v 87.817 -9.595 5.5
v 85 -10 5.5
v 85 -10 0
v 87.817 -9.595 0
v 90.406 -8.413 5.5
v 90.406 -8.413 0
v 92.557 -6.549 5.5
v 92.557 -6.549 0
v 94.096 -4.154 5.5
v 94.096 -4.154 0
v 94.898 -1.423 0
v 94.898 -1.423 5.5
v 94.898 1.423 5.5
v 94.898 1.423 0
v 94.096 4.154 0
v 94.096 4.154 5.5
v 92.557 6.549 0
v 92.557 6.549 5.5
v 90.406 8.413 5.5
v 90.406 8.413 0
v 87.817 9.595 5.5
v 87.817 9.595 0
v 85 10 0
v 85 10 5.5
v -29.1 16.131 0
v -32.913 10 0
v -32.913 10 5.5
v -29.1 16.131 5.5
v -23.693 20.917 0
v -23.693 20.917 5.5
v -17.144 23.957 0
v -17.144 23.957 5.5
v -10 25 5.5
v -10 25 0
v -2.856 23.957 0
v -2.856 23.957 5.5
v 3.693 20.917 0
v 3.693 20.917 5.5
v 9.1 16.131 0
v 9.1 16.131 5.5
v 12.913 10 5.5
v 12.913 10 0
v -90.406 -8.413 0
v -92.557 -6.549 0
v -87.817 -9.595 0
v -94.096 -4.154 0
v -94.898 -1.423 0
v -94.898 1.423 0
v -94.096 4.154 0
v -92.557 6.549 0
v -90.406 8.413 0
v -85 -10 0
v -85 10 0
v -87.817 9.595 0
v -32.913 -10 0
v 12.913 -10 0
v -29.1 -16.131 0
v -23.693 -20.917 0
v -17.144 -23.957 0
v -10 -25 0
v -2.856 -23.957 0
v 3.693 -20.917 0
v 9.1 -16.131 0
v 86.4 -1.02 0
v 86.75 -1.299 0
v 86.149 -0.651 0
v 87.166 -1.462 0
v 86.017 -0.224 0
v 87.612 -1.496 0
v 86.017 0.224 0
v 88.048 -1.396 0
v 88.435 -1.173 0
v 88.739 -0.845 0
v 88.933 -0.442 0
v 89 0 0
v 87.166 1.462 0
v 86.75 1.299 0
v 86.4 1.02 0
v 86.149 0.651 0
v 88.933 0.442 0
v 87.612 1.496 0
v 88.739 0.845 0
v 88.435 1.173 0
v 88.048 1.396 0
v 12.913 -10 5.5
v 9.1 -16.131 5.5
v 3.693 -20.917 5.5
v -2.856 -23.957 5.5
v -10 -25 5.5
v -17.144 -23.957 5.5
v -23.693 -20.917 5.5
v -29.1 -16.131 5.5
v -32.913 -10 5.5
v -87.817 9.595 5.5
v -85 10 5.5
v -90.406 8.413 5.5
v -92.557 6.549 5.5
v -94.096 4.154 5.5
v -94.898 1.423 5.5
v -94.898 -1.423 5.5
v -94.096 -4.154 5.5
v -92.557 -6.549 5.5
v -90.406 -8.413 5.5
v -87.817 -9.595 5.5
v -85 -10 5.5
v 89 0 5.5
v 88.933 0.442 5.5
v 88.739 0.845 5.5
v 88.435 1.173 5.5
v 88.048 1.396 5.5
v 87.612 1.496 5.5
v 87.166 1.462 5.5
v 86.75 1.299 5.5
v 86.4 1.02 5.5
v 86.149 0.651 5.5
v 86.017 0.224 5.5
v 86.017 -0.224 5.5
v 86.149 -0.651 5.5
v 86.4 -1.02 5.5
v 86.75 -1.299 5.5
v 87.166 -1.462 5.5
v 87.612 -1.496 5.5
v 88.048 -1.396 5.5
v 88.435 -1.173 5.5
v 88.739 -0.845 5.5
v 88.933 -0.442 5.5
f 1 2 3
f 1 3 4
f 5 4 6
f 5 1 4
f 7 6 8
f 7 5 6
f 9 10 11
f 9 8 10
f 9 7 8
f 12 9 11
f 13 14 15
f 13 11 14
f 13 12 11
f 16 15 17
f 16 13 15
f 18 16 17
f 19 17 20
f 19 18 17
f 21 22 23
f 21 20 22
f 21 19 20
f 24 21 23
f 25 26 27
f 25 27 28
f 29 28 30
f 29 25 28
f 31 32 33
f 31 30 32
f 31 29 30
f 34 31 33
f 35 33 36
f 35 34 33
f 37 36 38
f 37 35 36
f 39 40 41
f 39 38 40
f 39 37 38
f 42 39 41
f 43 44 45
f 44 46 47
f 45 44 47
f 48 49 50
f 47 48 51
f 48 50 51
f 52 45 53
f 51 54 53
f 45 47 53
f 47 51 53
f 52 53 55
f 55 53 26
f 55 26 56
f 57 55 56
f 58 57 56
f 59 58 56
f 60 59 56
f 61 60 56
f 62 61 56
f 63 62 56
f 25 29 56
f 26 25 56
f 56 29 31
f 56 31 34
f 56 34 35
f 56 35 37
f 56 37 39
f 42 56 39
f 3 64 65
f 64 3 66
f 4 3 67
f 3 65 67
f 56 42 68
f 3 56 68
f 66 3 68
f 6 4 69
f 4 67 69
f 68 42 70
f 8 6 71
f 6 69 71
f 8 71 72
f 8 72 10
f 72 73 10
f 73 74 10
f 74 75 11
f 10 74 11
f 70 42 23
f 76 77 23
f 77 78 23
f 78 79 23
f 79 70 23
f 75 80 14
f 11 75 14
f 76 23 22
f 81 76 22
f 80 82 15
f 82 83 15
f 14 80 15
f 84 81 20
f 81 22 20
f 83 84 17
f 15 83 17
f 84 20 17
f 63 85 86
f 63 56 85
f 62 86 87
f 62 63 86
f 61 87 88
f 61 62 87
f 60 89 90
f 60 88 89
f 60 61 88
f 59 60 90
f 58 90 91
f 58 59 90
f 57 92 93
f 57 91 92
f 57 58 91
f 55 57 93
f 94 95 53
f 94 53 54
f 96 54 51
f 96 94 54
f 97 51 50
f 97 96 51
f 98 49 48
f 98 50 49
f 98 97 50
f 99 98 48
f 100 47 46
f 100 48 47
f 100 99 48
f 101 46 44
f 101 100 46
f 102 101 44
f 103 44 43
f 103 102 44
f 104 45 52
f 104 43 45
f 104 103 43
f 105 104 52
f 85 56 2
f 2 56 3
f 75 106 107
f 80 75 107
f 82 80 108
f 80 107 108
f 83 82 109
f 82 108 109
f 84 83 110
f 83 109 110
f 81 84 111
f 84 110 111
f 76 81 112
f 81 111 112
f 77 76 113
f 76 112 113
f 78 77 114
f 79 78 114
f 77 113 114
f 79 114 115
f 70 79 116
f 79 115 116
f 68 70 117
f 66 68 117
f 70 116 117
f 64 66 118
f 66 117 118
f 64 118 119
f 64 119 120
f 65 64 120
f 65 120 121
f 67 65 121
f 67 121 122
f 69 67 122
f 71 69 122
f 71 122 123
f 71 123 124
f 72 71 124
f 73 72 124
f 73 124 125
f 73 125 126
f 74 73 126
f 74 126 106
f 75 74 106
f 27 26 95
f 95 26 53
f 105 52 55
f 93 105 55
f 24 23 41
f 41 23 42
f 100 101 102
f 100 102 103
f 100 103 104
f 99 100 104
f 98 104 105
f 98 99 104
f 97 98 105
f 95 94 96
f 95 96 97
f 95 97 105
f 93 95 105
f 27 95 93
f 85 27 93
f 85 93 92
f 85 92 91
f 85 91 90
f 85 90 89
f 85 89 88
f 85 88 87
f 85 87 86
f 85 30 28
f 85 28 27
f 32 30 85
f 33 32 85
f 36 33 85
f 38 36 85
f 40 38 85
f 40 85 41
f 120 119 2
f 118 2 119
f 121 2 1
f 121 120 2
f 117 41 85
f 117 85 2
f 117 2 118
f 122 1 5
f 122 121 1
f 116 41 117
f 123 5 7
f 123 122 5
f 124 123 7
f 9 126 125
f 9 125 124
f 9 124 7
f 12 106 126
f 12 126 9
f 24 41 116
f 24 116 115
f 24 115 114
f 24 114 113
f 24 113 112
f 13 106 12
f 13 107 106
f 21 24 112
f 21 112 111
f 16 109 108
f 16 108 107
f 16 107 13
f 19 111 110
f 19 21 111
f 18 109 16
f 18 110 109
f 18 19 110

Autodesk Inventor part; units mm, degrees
ref_plane "YZ Plane" through (0, 0, 0) normal (1, 0, 0) x (0, 1, 0)
ref_plane "XZ Plane" through (0, 0, 0) normal (0, 1, 0) x (-1, 0, 0)
ref_plane "XY Plane" through (0, 0, 0) normal (0, 0, 1) x (1, 0, 0)
sketch "Boceto1" plane through (0, 0, 0) normal (0, 0, 1) x (1, 0, 0)
  line L0 (0, 0) -> (-20, 0)
  line L1 (-20, 0) -> (0, 0)
  line L2 (-20, 0) -> (0, 0)
  line L3 (-65, -10) -> (65, -10)
  line L4 (65, -10) -> (65, 10)
  line L5 (65, 10) -> (-65, 10)
  line L6 (-65, 10) -> (-65, -10)
  circle A0 centre (-10, 0) radius 25
  point P0 (-20, -35)
  point P1 (12.9129, 10)
  point P2 (-32.9129, 10)
  point P3 (-32.9129, -10)
  point P4 (12.9129, -10)
  dimension "d4" = 20
  dimension "d6" = 130
  dimension "d7" = 20
  dimension "d8" = 50
extrude "Extrusión1" add sketch "Boceto1" along normal blind 5.5
sketch "Boceto2" plane through (0, 0, 5.5) normal (0, 0, 1) x (1, 0, 0)
  line L0 (65, -10) -> (65, 10) projected
  line L1 (65, 0) -> (90, 0)
  line L2 (65, 0) -> (85, 0)
  line L3 (85, 0) -> (90, 0)
  circle A0 centre (87.5, 0) radius 1.5
  line L4 (65, 0) -> (95, 0)
  line L5 (95, 0) -> (95, -10)
  line L6 (12.9129, -10) -> (65, -10) projected
  line L7 (95, -10) -> (65, -10)
  line L8 (65, -10) -> (65, 10)
  line L9 (95, 10) -> (65, 10)
  line L10 (95, 0) -> (95, 10)
  arc A1 (95, -2.0554) -> (95, 0) centre (85.9536, -1.0277) ccw
  arc A2 (95, 0) -> (95, 2.0554) centre (85.9536, 1.0277) ccw
  arc A3 (85, -10) -> (85, 10) centre (85, 0) ccw
  point P0 (0, 0)
  point P1 (87.5, -10)
  point P2 (87.5, 10)
  point P3 (95, 2.0554)
  point P4 (87.5, 10)
  point P5 (95, -2.0554)
  dimension "d11" = 25
  dimension "d12" = 20
  dimension "d13" = 3
  dimension "d14" = 30
extrude "Extrusión2" add sketch "Boceto2" against normal blind 5.5 contours L0 L1 A0 L4 A3 L7 | L0 L9 A3 L4 L1 A0
sketch "Boceto4" plane through (0, 0, 5.5) normal (0, 0, 1) x (1, 0, 0)
  line L0 (-65, 10) -> (-65, -10) projected
  line L1 (-65, 0) -> (-95, 0)
  line L2 (-95, 0) -> (-95, 10)
  line L3 (-95, 10) -> (-65, 10)
  line L4 (-65, -10) -> (-95, -10)
  line L5 (-95, -10) -> (-95, 0)
  line L6 (-65, 0) -> (-85, 0)
  arc A0 (-85, 10) -> (-85, -10) centre (-85, 0) ccw
  point P0 (0, 0)
  dimension "d17" = 30
  dimension "d18" = 20
extrude "Extrusión3" add sketch "Boceto4" against normal blind 5.5 contours L0 L1 A0 L3 | L0 L4 A0 L1
properties part number "lamina"
